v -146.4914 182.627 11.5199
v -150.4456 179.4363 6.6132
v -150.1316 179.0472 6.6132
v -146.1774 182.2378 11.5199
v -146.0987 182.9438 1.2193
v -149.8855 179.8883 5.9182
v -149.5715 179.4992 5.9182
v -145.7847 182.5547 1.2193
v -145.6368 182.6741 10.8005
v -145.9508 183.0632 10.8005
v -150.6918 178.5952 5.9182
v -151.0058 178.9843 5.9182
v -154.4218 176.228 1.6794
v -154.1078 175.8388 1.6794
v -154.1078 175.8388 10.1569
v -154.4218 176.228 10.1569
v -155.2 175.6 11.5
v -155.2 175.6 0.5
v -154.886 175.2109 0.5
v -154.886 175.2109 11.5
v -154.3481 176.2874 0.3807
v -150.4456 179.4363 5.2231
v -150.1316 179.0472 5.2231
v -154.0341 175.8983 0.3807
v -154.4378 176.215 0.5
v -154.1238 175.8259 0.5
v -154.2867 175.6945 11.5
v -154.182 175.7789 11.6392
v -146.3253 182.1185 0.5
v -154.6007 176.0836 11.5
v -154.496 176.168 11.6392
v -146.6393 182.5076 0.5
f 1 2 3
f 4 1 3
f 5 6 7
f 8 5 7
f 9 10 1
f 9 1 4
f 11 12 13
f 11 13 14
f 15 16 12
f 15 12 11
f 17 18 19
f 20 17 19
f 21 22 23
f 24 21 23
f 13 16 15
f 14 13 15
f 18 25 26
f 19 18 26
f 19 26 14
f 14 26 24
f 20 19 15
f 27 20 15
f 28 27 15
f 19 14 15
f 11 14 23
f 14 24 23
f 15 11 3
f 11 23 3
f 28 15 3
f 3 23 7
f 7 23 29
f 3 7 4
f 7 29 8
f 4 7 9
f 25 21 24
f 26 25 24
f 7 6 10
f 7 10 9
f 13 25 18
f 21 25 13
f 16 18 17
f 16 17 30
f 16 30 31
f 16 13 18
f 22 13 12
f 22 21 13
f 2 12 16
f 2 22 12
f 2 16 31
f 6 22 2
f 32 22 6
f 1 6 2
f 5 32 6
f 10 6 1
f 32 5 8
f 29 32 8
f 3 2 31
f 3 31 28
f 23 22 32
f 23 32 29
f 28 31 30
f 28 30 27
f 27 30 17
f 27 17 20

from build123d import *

# Parameters (mm, degrees)
BOX247_W                  = 0.5
BOX247_H                  = 1
BOX247_DEPTH              = 15
BOX247_ROLL_ANGLE         = 46
BOX248_W                  = 0.5
BOX248_H                  = 1
BOX248_DEPTH              = 15
BOX248_ROLL_ANGLE         = -46
BOX246_W                  = 0.5
BOX246_H                  = 1
BOX246_DEPTH              = 11
FUSION025_PLACEMENT_ANGLE = -51.1


with BuildPart() as cubo247:
    # Box247 → Box247 (new body)
    with BuildSketch(Plane.XY):
        with Locations((0.25, 0.5)):
            Rectangle(BOX247_W, BOX247_H)
    extrude(amount=BOX247_DEPTH)


with BuildPart() as cubo247_1:
    # Box247 roll: moved
    add(cubo247.part.rotate(Axis((0, 0, 0), (1, 0, 0)), BOX247_ROLL_ANGLE))


with BuildPart() as cubo247_2:
    # Box247 placement: moved
    add(cubo247_1.part.moved(Location((0, 11, 0.5))))


with BuildPart() as cubo248:
    # Box248 → Box248 (new body)
    with BuildSketch(Plane.XY):
        with Locations((0.25, 0.5)):
            Rectangle(BOX248_W, BOX248_H)
    extrude(amount=BOX248_DEPTH)


with BuildPart() as cubo248_1:
    # Box248 roll: moved
    add(cubo248.part.rotate(Axis((0, 0, 0), (1, 0, 0)), BOX248_ROLL_ANGLE))


with BuildPart() as cubo248_2:
    # Box248 placement: moved
    add(cubo248_1.part.moved(Location((0, 0.4, 1.1))))


with BuildPart() as fusion025:
    # Box246 → Box246 (new body)
    with BuildSketch(Plane.XY.offset(0.5)):
        with Locations((0.25, 0.5)):
            Rectangle(BOX246_W, BOX246_H)
    extrude(amount=BOX246_DEPTH)

    # Fusion025: union Cubo247, Cubo248
    add(cubo247_2.part)
    add(cubo248_2.part)


with BuildPart() as fusion025_1:
    # Fusion025 placement: moved
    add(fusion025.part.moved(Location((-155.2, 175.6, 0))).rotate(Axis((-155.2, 175.6, 0), (0, 0, 1)), FUSION025_PLACEMENT_ANGLE))


solid = fusion025_1.part
